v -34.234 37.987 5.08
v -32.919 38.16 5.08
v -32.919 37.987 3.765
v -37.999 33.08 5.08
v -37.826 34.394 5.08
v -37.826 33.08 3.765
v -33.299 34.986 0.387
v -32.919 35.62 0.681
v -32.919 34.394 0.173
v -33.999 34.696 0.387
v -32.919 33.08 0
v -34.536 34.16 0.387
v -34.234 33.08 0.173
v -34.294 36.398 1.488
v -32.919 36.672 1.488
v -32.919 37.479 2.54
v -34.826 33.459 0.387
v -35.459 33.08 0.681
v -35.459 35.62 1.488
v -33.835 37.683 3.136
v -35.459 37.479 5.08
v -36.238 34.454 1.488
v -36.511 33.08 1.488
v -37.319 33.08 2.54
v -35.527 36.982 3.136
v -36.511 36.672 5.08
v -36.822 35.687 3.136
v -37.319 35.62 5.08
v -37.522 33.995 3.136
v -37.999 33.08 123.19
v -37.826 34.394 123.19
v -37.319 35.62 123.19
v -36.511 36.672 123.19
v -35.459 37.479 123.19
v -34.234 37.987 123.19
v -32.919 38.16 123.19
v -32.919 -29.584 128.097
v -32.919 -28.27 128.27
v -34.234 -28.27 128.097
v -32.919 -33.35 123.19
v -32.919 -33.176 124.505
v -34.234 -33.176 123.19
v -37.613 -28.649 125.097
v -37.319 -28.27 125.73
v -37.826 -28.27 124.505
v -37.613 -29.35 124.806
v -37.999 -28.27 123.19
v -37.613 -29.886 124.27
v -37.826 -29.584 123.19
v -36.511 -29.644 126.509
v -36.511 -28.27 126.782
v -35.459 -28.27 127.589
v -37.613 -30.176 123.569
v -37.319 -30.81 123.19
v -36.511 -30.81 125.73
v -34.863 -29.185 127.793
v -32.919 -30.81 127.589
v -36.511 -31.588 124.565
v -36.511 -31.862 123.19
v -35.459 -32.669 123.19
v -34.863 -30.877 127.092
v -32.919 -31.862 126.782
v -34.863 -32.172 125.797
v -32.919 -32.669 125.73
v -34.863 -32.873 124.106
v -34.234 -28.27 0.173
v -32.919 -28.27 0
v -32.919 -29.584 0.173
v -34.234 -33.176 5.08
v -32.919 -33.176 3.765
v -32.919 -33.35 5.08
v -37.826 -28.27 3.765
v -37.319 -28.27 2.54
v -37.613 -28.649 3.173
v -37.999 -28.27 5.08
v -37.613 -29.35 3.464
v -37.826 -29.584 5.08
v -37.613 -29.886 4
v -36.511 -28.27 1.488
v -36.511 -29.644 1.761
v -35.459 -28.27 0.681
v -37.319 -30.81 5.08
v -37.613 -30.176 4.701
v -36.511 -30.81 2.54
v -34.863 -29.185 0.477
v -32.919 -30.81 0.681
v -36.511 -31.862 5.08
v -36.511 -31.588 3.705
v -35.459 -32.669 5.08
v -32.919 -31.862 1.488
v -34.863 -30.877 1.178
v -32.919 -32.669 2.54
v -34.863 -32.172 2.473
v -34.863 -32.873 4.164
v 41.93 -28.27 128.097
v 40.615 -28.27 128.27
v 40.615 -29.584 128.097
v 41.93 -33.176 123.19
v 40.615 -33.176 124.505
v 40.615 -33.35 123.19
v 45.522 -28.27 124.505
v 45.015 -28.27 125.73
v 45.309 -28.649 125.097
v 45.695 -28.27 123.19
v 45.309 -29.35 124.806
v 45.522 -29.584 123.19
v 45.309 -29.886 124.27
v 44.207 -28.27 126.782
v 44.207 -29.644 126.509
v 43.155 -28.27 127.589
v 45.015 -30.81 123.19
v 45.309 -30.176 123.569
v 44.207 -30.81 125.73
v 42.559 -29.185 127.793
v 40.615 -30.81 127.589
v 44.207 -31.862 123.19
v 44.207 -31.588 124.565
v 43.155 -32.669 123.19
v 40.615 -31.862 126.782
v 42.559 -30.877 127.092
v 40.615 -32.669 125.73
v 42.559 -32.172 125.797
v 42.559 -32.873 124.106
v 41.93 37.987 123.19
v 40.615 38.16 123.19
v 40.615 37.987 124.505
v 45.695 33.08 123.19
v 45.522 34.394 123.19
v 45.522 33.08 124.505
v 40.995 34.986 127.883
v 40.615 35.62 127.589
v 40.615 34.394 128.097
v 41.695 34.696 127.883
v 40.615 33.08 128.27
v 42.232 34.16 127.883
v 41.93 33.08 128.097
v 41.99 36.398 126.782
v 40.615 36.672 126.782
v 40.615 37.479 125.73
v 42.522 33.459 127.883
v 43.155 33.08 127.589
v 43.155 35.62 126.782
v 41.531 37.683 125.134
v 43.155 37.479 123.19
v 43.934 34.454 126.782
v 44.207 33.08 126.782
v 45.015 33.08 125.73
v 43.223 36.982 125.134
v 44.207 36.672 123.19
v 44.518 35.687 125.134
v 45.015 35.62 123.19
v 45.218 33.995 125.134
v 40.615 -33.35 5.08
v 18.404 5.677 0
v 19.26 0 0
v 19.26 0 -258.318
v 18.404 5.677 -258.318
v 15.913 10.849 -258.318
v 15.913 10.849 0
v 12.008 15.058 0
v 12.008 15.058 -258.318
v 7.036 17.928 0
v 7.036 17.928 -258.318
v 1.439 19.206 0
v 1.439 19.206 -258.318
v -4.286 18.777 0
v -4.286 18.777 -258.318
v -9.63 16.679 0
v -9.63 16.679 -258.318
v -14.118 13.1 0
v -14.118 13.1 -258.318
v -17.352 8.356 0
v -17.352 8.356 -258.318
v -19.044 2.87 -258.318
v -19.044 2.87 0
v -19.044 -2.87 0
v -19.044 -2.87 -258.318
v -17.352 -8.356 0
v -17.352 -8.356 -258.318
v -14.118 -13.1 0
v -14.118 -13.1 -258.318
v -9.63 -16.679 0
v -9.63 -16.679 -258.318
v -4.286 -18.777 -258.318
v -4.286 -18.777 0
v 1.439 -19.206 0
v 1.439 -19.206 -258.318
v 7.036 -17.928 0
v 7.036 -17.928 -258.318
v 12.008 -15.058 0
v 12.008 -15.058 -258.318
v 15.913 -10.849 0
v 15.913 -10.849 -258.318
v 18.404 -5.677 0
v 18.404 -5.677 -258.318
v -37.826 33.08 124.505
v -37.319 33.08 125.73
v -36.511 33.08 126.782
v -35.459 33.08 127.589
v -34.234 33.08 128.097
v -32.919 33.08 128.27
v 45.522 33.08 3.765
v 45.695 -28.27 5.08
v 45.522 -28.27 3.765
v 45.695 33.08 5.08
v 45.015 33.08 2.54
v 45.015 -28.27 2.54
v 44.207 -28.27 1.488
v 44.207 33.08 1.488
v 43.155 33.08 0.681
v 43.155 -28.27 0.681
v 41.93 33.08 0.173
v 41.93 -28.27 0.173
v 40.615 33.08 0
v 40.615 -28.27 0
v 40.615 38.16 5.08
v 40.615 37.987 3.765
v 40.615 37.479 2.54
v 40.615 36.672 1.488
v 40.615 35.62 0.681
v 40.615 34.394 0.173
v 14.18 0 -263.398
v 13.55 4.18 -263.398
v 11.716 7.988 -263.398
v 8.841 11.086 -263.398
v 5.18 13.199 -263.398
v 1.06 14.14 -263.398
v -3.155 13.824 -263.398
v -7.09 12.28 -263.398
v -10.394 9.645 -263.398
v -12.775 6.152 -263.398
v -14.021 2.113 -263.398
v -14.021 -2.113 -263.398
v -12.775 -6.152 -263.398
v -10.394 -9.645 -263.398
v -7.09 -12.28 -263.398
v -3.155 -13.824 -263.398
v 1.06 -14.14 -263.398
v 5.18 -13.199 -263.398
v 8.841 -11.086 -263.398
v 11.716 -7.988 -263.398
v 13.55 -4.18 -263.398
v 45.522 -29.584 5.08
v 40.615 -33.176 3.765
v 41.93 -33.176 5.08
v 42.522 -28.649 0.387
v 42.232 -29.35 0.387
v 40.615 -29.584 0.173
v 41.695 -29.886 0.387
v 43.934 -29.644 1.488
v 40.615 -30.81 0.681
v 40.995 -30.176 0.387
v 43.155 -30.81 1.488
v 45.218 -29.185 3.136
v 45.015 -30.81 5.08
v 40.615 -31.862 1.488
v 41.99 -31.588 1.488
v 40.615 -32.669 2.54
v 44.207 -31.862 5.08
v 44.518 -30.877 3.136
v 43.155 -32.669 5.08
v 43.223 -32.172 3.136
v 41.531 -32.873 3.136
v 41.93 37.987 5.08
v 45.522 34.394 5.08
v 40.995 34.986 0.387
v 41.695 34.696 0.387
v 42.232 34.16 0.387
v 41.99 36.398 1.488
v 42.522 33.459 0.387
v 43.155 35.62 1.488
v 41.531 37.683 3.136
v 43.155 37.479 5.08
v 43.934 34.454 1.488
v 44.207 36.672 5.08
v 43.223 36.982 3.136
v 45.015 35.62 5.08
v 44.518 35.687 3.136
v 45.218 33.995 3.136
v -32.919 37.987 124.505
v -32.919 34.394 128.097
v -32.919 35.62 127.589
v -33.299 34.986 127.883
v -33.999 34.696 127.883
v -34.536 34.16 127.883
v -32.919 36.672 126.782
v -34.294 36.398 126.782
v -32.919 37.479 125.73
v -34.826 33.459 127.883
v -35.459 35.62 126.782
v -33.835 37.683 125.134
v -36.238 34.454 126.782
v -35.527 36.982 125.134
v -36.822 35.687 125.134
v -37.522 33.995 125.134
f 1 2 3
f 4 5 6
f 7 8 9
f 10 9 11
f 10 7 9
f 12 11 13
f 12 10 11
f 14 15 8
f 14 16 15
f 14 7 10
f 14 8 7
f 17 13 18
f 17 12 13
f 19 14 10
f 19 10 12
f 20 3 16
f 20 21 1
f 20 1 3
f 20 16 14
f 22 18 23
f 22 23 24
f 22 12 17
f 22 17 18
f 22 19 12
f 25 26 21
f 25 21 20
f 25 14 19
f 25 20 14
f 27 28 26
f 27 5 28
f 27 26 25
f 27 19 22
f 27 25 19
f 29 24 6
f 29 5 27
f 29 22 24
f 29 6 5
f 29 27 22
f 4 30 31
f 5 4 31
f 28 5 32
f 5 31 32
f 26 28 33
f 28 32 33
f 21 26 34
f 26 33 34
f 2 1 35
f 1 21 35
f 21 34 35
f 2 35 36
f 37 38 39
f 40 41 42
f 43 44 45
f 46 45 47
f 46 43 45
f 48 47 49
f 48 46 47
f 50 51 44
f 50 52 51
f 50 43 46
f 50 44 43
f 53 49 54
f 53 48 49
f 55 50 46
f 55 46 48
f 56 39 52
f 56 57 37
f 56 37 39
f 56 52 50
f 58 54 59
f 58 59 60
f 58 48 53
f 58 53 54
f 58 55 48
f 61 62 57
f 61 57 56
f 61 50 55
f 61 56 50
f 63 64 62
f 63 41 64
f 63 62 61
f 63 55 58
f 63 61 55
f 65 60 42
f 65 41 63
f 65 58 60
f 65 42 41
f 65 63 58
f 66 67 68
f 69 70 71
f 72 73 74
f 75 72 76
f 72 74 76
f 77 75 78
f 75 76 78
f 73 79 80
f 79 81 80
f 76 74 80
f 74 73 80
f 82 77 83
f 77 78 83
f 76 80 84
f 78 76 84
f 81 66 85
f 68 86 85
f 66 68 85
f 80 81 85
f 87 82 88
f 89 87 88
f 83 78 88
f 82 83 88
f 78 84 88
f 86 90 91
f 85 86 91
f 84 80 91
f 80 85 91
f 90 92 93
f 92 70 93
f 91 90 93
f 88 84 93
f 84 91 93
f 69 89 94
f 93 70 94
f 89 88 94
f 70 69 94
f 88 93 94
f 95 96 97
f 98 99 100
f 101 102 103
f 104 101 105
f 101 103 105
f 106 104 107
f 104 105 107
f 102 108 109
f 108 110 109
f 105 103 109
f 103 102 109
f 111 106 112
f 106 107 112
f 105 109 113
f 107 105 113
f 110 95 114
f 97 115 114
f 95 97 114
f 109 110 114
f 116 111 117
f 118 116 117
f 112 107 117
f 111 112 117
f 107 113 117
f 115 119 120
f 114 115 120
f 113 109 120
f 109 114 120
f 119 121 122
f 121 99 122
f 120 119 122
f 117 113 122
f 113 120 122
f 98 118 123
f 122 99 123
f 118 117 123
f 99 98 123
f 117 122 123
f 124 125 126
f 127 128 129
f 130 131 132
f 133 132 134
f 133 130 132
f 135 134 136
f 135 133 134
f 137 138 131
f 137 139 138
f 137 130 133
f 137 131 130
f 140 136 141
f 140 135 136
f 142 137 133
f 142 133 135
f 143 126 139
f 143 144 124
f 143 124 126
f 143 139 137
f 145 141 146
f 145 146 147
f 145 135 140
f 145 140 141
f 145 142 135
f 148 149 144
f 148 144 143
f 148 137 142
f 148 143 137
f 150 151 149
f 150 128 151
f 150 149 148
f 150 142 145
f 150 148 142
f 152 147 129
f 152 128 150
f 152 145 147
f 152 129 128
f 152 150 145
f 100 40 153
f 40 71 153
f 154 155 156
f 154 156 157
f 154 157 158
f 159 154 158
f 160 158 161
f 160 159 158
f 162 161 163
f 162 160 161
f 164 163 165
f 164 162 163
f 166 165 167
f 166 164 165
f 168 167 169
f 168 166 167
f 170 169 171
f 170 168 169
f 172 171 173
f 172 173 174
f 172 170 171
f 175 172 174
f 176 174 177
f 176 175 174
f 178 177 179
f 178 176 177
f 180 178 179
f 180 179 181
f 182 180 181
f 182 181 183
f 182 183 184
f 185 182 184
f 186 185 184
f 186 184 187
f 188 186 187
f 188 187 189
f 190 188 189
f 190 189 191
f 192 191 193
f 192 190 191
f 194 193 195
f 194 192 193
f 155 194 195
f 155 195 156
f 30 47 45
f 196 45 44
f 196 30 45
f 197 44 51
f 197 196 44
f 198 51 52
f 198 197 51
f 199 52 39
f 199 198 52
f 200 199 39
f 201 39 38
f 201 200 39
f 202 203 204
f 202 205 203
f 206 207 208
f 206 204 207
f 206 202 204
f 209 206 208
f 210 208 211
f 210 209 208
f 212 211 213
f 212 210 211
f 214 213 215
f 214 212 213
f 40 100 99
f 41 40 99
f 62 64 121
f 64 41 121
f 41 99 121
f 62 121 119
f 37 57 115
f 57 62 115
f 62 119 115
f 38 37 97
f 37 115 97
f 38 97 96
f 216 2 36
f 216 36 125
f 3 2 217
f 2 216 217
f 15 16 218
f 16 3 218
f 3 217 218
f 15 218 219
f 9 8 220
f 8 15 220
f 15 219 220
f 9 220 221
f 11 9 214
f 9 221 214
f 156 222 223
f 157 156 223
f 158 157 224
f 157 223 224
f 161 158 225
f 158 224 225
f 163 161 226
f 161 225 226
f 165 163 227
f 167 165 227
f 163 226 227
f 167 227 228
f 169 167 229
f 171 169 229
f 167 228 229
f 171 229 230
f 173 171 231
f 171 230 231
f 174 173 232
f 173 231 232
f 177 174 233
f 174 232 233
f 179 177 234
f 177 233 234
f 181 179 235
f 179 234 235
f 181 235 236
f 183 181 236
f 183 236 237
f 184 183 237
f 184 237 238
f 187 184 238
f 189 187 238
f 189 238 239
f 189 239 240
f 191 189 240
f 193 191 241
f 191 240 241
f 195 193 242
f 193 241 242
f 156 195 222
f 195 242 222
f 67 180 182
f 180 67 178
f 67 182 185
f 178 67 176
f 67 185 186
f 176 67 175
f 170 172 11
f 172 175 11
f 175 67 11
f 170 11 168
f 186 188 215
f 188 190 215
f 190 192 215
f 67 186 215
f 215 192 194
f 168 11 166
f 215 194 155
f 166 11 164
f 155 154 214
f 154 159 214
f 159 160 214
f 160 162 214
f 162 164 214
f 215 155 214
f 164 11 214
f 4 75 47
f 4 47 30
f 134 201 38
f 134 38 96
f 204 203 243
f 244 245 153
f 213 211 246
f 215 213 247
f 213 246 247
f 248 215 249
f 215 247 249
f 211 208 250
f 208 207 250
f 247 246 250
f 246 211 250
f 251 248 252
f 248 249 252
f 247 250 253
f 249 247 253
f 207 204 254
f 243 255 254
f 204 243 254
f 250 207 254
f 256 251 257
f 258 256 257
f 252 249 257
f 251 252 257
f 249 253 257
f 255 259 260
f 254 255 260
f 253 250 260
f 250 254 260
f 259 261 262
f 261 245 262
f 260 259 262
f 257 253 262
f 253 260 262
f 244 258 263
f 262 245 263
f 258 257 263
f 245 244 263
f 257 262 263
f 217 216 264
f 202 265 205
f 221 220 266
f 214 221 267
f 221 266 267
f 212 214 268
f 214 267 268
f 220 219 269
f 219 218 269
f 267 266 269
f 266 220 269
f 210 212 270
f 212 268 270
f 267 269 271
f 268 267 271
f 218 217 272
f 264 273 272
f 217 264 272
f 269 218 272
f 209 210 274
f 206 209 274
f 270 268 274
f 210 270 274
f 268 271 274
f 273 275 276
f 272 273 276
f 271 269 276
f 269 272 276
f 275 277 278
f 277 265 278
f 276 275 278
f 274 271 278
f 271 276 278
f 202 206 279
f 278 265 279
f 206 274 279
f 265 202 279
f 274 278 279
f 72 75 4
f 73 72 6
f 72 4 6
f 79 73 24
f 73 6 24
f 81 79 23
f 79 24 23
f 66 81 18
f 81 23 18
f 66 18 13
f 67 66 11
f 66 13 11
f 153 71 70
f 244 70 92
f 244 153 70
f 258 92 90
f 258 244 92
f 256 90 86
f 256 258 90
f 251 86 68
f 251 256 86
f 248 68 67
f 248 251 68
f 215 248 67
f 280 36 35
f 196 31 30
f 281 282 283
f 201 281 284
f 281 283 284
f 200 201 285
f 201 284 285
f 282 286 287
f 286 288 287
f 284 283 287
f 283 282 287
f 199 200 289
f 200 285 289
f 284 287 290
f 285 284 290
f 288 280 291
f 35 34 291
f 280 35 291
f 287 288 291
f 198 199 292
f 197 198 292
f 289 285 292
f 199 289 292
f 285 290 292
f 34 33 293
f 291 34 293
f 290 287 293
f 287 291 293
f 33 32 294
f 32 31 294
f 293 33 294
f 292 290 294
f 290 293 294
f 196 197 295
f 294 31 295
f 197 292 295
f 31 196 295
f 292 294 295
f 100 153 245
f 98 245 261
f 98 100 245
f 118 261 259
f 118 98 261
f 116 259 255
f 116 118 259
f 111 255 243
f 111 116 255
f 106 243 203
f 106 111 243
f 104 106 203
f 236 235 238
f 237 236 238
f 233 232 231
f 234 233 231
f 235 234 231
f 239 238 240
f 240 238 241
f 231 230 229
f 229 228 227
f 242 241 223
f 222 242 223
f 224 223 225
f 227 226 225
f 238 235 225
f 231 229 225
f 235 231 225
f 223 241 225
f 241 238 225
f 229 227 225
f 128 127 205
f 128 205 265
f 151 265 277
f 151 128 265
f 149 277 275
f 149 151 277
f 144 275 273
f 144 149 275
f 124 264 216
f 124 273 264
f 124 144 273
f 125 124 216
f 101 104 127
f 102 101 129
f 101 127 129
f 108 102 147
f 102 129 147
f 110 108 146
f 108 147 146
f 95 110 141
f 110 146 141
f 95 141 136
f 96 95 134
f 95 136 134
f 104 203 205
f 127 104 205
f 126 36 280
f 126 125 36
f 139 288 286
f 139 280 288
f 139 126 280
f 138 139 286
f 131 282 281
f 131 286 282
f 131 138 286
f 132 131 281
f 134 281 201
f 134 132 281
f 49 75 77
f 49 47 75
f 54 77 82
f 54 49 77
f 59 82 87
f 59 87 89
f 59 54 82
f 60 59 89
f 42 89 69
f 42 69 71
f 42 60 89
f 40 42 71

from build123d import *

# Parameters (mm, degrees)
F0_W     = 83.694592
F0_H     = 71.509171
F1_DEPTH = 128.27
F2_R     = 5.08
F3_R     = 19.259612
F4_DEPTH = 263.398
F5_SIZE  = 5.08


with BuildPart() as f1:
    # F0 (on Top) → F1 (new body)
    with BuildSketch(Plane.XY):
        with Locations((3.848031, 2.405015)):
            Rectangle(F0_W, F0_H)
    extrude(amount=F1_DEPTH)

    # F2
    f2_edges = [f1.edges().sort_by_distance(p)[0] for p in [
        (45.695327, 38.159601, 64.135),
        (-37.999265, 38.159601, 64.135),
        (3.848031, 38.159601, 0),
        (3.848031, 38.159601, 128.27),
        (3.848031, -33.34957, 128.27),
        (45.695327, 2.405016, 128.27),
        (-37.999265, 2.405016, 128.27),
        (45.695327, -33.34957, 64.135),
        (45.695327, 2.405016, 0),
        (3.848031, -33.34957, 0),
        (-37.999265, 2.405016, 0),
        (-37.999265, -33.34957, 64.135),
    ]]
    fillet(f2_edges, radius=F2_R)

    # F3 (on Top) → F4 (join)
    with BuildSketch(Plane.XY):
        Circle(F3_R)
    extrude(amount=-F4_DEPTH)

    # F5
    f5_edges = [f1.edges().sort_by_distance(p)[0] for p in [
        (-19.259612, 0, -263.398),
    ]]
    chamfer(f5_edges, length=F5_SIZE)


solid = f1.part
